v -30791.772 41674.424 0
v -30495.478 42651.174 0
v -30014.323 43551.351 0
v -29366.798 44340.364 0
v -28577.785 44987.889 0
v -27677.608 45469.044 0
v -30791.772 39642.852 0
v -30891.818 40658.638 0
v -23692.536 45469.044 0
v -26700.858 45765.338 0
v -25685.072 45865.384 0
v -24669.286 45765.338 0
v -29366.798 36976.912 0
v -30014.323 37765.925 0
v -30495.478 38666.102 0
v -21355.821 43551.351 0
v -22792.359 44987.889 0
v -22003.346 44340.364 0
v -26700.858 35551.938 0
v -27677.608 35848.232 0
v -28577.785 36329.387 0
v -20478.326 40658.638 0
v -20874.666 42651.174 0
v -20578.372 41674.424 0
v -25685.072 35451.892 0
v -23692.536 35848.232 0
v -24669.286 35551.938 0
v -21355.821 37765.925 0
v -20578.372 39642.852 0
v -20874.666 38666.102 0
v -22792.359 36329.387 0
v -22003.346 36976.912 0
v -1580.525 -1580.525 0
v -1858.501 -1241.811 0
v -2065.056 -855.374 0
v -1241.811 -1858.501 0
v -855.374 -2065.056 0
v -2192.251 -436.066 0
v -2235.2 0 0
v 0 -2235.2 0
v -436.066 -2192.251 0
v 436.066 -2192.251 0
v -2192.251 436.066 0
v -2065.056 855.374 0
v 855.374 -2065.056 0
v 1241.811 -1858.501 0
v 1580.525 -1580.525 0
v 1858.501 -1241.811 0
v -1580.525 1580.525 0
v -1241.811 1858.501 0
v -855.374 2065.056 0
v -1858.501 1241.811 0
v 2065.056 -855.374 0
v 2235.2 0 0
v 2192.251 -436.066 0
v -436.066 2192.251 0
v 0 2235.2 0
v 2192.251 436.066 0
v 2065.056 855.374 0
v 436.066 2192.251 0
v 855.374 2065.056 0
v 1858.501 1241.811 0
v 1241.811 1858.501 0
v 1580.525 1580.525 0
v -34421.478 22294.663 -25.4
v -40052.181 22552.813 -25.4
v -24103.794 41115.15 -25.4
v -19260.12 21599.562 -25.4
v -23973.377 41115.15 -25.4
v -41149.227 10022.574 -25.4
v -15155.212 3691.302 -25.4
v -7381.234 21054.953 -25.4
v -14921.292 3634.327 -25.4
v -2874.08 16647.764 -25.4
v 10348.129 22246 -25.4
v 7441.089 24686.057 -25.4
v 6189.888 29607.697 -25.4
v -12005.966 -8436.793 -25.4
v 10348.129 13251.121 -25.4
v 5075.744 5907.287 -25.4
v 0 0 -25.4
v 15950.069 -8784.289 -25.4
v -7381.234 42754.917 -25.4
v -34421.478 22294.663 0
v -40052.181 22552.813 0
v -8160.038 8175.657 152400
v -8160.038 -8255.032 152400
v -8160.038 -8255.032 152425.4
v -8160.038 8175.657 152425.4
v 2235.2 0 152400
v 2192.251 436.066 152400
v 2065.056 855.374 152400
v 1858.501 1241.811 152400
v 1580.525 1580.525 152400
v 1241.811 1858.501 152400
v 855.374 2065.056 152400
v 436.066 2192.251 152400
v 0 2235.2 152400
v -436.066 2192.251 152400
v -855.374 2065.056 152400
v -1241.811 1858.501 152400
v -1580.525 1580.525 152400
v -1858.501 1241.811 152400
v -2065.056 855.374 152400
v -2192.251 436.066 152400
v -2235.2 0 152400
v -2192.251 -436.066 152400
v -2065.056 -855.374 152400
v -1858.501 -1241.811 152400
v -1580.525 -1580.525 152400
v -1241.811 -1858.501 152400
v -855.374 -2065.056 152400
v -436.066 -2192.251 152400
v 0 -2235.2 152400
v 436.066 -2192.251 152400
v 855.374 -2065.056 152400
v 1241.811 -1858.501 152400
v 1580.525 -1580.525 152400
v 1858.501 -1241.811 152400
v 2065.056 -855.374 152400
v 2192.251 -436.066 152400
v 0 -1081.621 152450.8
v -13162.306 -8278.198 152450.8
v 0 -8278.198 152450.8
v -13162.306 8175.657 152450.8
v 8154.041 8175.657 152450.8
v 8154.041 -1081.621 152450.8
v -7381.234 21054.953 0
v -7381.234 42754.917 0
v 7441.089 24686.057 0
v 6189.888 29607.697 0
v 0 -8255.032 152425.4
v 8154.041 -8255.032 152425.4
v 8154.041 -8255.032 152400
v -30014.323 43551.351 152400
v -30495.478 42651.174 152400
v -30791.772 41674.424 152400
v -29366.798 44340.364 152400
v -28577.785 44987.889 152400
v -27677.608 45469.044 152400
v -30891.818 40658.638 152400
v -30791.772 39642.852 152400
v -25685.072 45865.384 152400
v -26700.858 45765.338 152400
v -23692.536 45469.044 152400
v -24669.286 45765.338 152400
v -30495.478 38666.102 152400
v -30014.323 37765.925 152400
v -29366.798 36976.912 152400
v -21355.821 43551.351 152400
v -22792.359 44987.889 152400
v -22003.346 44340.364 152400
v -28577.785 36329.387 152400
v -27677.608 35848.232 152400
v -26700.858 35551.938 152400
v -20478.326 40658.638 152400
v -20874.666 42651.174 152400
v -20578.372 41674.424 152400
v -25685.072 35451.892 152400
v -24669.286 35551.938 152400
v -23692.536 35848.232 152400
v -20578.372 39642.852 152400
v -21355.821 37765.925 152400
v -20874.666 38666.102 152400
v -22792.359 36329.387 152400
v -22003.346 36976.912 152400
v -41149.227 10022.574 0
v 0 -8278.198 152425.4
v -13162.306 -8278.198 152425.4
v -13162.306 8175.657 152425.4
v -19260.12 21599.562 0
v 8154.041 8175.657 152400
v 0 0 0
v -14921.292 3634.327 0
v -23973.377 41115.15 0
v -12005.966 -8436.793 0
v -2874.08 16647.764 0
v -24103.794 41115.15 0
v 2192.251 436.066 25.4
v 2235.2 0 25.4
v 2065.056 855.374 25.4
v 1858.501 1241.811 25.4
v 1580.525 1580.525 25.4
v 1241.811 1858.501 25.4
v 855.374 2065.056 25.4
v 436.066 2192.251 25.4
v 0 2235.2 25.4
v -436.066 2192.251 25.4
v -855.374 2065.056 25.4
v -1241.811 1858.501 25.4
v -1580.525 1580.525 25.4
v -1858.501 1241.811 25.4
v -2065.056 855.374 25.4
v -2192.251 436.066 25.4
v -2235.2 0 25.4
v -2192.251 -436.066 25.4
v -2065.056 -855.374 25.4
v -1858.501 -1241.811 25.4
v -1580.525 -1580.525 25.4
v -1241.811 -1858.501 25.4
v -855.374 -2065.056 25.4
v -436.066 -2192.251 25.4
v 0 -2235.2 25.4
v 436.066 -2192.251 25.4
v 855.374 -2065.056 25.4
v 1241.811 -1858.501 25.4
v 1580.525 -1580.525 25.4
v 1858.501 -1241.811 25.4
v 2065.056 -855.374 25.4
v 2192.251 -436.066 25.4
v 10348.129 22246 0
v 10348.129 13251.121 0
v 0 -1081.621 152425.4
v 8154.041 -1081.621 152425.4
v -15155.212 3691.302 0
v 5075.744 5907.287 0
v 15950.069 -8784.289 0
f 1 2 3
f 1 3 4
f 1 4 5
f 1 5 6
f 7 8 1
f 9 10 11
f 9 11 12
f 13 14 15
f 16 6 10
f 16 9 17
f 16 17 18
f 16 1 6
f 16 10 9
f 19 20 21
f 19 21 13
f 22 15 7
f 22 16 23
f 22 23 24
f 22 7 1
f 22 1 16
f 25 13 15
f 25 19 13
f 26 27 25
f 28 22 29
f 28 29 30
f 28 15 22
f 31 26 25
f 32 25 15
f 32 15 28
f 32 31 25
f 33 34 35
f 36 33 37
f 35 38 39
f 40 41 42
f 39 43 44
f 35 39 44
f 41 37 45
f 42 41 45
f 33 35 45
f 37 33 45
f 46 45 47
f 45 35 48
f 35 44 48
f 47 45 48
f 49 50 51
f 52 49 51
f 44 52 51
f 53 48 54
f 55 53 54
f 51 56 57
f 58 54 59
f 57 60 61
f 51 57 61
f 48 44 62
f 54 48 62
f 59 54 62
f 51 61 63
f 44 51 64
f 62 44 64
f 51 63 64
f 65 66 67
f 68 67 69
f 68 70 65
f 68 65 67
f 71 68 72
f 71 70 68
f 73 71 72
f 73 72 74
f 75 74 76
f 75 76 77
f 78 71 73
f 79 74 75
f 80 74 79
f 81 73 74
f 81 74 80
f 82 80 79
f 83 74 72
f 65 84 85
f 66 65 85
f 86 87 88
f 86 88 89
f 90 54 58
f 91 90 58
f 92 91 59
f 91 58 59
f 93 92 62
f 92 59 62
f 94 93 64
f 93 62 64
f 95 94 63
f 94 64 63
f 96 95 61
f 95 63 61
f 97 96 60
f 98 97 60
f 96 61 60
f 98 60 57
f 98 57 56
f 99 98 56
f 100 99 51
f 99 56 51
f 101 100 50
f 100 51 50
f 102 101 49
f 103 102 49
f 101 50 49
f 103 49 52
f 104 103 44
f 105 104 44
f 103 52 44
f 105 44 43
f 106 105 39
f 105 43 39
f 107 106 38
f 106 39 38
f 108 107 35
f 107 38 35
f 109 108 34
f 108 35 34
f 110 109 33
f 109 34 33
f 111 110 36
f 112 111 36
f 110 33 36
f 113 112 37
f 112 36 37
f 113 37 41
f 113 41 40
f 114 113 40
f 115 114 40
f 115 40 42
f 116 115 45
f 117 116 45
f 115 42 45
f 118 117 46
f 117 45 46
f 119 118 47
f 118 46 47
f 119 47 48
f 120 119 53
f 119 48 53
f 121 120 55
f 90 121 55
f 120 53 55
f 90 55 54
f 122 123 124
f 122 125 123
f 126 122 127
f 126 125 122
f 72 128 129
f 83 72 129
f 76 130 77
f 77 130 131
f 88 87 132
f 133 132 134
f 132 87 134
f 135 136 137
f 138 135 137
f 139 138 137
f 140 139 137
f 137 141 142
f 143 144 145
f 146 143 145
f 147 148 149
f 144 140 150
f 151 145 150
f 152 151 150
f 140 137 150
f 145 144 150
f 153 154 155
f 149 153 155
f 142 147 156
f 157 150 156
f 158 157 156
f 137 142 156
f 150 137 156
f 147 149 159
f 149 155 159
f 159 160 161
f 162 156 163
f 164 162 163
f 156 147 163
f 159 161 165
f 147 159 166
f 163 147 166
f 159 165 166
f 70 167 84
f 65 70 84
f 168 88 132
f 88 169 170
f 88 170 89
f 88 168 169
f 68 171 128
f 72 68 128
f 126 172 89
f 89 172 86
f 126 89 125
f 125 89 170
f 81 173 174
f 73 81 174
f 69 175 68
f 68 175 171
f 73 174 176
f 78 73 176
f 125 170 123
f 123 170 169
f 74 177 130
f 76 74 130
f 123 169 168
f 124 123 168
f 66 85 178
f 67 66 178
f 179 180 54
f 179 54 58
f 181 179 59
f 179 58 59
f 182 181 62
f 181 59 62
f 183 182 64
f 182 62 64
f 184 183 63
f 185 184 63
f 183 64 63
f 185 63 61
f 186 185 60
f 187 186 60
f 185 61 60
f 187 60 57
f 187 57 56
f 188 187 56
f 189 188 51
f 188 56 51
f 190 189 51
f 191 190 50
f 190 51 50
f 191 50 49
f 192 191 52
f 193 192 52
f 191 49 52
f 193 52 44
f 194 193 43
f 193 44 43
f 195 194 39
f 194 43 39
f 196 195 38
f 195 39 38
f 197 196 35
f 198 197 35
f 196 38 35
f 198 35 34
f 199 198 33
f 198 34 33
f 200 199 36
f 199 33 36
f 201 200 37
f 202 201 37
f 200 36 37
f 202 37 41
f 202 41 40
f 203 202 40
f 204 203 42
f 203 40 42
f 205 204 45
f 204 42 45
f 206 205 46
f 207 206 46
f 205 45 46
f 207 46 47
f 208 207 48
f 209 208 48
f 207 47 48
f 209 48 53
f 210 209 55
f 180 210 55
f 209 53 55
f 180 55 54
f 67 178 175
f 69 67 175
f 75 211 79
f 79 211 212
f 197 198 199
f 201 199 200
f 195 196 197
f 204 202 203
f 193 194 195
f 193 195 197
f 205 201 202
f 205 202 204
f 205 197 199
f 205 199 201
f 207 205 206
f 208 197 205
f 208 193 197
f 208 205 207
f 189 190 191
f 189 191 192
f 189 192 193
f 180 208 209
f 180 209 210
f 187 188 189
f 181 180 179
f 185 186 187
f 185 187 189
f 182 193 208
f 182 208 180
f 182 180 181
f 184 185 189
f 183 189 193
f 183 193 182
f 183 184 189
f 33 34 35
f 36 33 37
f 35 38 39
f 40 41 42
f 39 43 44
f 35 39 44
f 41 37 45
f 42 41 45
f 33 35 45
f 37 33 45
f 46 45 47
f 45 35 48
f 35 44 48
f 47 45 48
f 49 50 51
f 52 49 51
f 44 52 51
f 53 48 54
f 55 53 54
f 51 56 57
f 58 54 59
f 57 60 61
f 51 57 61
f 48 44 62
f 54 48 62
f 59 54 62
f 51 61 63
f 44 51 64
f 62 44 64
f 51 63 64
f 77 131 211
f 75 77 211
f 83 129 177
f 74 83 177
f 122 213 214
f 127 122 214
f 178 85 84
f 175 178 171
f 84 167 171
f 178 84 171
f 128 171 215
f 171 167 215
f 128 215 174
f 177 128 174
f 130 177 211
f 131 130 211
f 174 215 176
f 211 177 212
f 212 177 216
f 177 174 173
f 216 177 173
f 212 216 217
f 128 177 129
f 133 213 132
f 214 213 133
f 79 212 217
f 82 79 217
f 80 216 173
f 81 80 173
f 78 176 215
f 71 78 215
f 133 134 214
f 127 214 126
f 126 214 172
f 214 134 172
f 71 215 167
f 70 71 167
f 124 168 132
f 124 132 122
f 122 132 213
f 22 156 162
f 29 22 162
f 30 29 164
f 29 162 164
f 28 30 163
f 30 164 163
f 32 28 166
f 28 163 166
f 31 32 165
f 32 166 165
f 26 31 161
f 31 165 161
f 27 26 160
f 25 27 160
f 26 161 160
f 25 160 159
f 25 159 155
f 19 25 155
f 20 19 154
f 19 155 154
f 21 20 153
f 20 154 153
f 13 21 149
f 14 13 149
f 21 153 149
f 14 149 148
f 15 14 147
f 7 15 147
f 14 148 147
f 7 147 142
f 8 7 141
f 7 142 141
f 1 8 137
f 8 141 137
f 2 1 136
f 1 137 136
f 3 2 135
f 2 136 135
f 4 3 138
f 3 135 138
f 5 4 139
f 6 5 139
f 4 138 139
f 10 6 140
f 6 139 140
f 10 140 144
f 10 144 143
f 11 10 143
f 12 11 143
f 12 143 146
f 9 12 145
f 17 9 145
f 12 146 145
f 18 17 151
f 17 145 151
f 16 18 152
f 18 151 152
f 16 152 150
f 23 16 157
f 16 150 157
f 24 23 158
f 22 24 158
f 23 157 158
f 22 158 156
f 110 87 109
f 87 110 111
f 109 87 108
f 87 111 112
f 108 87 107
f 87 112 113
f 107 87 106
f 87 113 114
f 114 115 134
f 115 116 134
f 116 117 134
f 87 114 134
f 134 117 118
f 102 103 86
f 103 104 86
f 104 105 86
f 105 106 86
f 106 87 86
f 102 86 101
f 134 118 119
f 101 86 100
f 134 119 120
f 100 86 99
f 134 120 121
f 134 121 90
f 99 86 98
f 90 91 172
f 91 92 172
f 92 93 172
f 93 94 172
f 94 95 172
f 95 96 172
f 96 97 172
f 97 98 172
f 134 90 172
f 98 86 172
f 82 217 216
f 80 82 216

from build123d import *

# Parameters (mm, degrees)
F0_R      = 2235.2
F1_DEPTH  = 152400
F2_W      = 16314.079284668
F2_H      = 16430.6888580322
F3_DEPTH  = 25.4
F4_W      = 13162.3058319092
F4_H      = 7196.5775489807
F5_DEPTH  = 25.4
F6_R      = 5206.746363133
F7_DEPTH  = 152400
F8_W      = 130.4168701172
F8_H      = 3464.111328125
F9_DEPTH  = 25.4
F10_DEPTH = 25.4


with BuildPart() as f1:
    # F0 (on Top) → F1 (new body)
    with BuildSketch(Plane.XY):
        Circle(F0_R)
    extrude(amount=F1_DEPTH)

    # F2 (on face) → F3 (join)
    with BuildSketch(Plane.XY.offset(152400)):
        with Locations((-2.9983520508, -39.6871566772)):
            Rectangle(F2_W, F2_H)
    extrude(amount=F3_DEPTH)

    # F4 (on face) → F5 (join)
    with BuildSketch(Plane.XY.offset(152425.4)):
        with Locations((-6581.1529159546, -4679.9094676971)):
            Rectangle(F4_W, F4_H)
        Polygon((-13162.3058319092, -1081.6206932068), (0, -1081.6206932068), (8154.0412902832, -1081.6206932068), (8154.0412902832, 8175.6572723389), (-13162.3058319092, 8175.6572723389), align=None)
    extrude(amount=F5_DEPTH)


with BuildPart() as f7:
    # F6 (on face) → F7 (new body, through all)
    with BuildSketch(Plane(origin=(0, 0, 152400), x_dir=(1, 0, 0), z_dir=(0, 0, -1))):
        with Locations((-25685.0719451904, -40658.6380004883)):
            Circle(F6_R)
    extrude(amount=F7_DEPTH)


with BuildPart() as f9:
    # F8 (on face) → F9 (new body)
    with BuildSketch(Plane(origin=(0, 0, 0), x_dir=(1, 0, 0), z_dir=(0, 0, -1))):
        with Locations((-24038.5856628418, -39383.0947875977)):
            Rectangle(F8_W, F8_H)
        Polygon((-34421.4778333763, -22294.6625748956), (-24103.7940979004, -41115.1504516602), (-24103.7940979004, -37651.0391235352), (-23973.3772277832, -37651.0391235352), (-19811.9348288427, -21624.8610825982), align=None)
        Polygon((-40052.1812438965, -22552.8125762939), (-24103.7940979004, -41115.1504516602), (-34421.4778333763, -22294.6625748956), align=None)
        Polygon((-23973.3772277832, -37651.0391235352), (-23973.3772277832, -41115.1504516602), (-19260.1197917863, -21599.5621026658), (-19811.9348288427, -21624.8610825982), align=None)
        Polygon((-41149.227142334, -10022.5744247436), (-34421.4778333763, -22294.6625748956), (-19811.9348288427, -21624.8610825982), (-16222.995959886, -7803.457881972), align=None)
        Polygon((-15921.7109515854, -7776.6352732464), (-19260.1197917863, -21599.5621026658), (-7381.2336921692, -21054.95262146), (-2301.1527002977, -6564.0329381408), align=None)
        Polygon((-19811.9348288427, -21624.8610825982), (-19260.1197917863, -21599.5621026658), (-15921.7109515854, -7776.6352732464), (-16222.995959886, -7803.457881972), align=None)
        Polygon((-15155.2118404192, -3691.3023437344), (-41149.227142334, -10022.5744247437), (-16222.995959886, -7803.457881972), align=None)
        Polygon((-2301.1527002977, -6564.0329381408), (-7381.2336921692, -21054.95262146), (-7381.2336921692, -42754.9171447754), (-2874.0796962277, -16647.7643717013), (-1114.9874071605, -6458.4317742426), align=None)
        Polygon((-16222.995959886, -7803.457881972), (-15921.7109515854, -7776.6352732464), (-14921.2920315378, -3634.3273078285), (-15155.2118404192, -3691.3023437344), align=None)
        Polygon((-14921.2920315378, -3634.3273078285), (-15921.7109515854, -7776.6352732464), (-2301.1527002977, -6564.0329381408), (0, 0), align=None)
        Polygon((-12005.9661865234, 8436.7933273315), (-15155.2118404192, -3691.3023437344), (-14921.2920315378, -3634.3273078285), align=None)
        Polygon((0, 0), (-2301.1527002977, -6564.0329381408), (-1114.9874071605, -6458.4317742426), align=None)
        Polygon((5075.7439402199, -5907.2873094308), (-2874.0796962277, -16647.7643717013), (10348.1292724609, -12262.6476287842), (10348.1292724609, -13251.1214584158), (15950.0694274902, 8784.2893600464), align=None)
        Polygon((-1114.9874071605, -6458.4317742426), (-2874.0796962277, -16647.7643717013), (5075.7439402199, -5907.2873094308), align=None)
        Polygon((10348.1292724609, -12262.6476287842), (-2874.0796962277, -16647.7643717013), (7441.0890589714, -24686.057140926), (10348.1292724609, -13251.1214584158), align=None)
        Polygon((5075.7439402199, -5907.2873094308), (0, 0), (-1114.9874071605, -6458.4317742426), align=None)
        Polygon((10348.1292724609, -13251.1214584158), (7441.0890589715, -24686.057140926), (6189.8880004883, -29607.6965332031), (10348.1292724609, -22246.000289917), (10348.1292724609, -14536.7050170898), align=None)
    extrude(amount=F9_DEPTH)


with BuildPart() as f10:
    # F0 (on Top) → F10 (new body)
    with BuildSketch(Plane.XY):
        Circle(F0_R)
    extrude(amount=F10_DEPTH)


solid = Compound([f1.part, f7.part, f9.part, f10.part])
